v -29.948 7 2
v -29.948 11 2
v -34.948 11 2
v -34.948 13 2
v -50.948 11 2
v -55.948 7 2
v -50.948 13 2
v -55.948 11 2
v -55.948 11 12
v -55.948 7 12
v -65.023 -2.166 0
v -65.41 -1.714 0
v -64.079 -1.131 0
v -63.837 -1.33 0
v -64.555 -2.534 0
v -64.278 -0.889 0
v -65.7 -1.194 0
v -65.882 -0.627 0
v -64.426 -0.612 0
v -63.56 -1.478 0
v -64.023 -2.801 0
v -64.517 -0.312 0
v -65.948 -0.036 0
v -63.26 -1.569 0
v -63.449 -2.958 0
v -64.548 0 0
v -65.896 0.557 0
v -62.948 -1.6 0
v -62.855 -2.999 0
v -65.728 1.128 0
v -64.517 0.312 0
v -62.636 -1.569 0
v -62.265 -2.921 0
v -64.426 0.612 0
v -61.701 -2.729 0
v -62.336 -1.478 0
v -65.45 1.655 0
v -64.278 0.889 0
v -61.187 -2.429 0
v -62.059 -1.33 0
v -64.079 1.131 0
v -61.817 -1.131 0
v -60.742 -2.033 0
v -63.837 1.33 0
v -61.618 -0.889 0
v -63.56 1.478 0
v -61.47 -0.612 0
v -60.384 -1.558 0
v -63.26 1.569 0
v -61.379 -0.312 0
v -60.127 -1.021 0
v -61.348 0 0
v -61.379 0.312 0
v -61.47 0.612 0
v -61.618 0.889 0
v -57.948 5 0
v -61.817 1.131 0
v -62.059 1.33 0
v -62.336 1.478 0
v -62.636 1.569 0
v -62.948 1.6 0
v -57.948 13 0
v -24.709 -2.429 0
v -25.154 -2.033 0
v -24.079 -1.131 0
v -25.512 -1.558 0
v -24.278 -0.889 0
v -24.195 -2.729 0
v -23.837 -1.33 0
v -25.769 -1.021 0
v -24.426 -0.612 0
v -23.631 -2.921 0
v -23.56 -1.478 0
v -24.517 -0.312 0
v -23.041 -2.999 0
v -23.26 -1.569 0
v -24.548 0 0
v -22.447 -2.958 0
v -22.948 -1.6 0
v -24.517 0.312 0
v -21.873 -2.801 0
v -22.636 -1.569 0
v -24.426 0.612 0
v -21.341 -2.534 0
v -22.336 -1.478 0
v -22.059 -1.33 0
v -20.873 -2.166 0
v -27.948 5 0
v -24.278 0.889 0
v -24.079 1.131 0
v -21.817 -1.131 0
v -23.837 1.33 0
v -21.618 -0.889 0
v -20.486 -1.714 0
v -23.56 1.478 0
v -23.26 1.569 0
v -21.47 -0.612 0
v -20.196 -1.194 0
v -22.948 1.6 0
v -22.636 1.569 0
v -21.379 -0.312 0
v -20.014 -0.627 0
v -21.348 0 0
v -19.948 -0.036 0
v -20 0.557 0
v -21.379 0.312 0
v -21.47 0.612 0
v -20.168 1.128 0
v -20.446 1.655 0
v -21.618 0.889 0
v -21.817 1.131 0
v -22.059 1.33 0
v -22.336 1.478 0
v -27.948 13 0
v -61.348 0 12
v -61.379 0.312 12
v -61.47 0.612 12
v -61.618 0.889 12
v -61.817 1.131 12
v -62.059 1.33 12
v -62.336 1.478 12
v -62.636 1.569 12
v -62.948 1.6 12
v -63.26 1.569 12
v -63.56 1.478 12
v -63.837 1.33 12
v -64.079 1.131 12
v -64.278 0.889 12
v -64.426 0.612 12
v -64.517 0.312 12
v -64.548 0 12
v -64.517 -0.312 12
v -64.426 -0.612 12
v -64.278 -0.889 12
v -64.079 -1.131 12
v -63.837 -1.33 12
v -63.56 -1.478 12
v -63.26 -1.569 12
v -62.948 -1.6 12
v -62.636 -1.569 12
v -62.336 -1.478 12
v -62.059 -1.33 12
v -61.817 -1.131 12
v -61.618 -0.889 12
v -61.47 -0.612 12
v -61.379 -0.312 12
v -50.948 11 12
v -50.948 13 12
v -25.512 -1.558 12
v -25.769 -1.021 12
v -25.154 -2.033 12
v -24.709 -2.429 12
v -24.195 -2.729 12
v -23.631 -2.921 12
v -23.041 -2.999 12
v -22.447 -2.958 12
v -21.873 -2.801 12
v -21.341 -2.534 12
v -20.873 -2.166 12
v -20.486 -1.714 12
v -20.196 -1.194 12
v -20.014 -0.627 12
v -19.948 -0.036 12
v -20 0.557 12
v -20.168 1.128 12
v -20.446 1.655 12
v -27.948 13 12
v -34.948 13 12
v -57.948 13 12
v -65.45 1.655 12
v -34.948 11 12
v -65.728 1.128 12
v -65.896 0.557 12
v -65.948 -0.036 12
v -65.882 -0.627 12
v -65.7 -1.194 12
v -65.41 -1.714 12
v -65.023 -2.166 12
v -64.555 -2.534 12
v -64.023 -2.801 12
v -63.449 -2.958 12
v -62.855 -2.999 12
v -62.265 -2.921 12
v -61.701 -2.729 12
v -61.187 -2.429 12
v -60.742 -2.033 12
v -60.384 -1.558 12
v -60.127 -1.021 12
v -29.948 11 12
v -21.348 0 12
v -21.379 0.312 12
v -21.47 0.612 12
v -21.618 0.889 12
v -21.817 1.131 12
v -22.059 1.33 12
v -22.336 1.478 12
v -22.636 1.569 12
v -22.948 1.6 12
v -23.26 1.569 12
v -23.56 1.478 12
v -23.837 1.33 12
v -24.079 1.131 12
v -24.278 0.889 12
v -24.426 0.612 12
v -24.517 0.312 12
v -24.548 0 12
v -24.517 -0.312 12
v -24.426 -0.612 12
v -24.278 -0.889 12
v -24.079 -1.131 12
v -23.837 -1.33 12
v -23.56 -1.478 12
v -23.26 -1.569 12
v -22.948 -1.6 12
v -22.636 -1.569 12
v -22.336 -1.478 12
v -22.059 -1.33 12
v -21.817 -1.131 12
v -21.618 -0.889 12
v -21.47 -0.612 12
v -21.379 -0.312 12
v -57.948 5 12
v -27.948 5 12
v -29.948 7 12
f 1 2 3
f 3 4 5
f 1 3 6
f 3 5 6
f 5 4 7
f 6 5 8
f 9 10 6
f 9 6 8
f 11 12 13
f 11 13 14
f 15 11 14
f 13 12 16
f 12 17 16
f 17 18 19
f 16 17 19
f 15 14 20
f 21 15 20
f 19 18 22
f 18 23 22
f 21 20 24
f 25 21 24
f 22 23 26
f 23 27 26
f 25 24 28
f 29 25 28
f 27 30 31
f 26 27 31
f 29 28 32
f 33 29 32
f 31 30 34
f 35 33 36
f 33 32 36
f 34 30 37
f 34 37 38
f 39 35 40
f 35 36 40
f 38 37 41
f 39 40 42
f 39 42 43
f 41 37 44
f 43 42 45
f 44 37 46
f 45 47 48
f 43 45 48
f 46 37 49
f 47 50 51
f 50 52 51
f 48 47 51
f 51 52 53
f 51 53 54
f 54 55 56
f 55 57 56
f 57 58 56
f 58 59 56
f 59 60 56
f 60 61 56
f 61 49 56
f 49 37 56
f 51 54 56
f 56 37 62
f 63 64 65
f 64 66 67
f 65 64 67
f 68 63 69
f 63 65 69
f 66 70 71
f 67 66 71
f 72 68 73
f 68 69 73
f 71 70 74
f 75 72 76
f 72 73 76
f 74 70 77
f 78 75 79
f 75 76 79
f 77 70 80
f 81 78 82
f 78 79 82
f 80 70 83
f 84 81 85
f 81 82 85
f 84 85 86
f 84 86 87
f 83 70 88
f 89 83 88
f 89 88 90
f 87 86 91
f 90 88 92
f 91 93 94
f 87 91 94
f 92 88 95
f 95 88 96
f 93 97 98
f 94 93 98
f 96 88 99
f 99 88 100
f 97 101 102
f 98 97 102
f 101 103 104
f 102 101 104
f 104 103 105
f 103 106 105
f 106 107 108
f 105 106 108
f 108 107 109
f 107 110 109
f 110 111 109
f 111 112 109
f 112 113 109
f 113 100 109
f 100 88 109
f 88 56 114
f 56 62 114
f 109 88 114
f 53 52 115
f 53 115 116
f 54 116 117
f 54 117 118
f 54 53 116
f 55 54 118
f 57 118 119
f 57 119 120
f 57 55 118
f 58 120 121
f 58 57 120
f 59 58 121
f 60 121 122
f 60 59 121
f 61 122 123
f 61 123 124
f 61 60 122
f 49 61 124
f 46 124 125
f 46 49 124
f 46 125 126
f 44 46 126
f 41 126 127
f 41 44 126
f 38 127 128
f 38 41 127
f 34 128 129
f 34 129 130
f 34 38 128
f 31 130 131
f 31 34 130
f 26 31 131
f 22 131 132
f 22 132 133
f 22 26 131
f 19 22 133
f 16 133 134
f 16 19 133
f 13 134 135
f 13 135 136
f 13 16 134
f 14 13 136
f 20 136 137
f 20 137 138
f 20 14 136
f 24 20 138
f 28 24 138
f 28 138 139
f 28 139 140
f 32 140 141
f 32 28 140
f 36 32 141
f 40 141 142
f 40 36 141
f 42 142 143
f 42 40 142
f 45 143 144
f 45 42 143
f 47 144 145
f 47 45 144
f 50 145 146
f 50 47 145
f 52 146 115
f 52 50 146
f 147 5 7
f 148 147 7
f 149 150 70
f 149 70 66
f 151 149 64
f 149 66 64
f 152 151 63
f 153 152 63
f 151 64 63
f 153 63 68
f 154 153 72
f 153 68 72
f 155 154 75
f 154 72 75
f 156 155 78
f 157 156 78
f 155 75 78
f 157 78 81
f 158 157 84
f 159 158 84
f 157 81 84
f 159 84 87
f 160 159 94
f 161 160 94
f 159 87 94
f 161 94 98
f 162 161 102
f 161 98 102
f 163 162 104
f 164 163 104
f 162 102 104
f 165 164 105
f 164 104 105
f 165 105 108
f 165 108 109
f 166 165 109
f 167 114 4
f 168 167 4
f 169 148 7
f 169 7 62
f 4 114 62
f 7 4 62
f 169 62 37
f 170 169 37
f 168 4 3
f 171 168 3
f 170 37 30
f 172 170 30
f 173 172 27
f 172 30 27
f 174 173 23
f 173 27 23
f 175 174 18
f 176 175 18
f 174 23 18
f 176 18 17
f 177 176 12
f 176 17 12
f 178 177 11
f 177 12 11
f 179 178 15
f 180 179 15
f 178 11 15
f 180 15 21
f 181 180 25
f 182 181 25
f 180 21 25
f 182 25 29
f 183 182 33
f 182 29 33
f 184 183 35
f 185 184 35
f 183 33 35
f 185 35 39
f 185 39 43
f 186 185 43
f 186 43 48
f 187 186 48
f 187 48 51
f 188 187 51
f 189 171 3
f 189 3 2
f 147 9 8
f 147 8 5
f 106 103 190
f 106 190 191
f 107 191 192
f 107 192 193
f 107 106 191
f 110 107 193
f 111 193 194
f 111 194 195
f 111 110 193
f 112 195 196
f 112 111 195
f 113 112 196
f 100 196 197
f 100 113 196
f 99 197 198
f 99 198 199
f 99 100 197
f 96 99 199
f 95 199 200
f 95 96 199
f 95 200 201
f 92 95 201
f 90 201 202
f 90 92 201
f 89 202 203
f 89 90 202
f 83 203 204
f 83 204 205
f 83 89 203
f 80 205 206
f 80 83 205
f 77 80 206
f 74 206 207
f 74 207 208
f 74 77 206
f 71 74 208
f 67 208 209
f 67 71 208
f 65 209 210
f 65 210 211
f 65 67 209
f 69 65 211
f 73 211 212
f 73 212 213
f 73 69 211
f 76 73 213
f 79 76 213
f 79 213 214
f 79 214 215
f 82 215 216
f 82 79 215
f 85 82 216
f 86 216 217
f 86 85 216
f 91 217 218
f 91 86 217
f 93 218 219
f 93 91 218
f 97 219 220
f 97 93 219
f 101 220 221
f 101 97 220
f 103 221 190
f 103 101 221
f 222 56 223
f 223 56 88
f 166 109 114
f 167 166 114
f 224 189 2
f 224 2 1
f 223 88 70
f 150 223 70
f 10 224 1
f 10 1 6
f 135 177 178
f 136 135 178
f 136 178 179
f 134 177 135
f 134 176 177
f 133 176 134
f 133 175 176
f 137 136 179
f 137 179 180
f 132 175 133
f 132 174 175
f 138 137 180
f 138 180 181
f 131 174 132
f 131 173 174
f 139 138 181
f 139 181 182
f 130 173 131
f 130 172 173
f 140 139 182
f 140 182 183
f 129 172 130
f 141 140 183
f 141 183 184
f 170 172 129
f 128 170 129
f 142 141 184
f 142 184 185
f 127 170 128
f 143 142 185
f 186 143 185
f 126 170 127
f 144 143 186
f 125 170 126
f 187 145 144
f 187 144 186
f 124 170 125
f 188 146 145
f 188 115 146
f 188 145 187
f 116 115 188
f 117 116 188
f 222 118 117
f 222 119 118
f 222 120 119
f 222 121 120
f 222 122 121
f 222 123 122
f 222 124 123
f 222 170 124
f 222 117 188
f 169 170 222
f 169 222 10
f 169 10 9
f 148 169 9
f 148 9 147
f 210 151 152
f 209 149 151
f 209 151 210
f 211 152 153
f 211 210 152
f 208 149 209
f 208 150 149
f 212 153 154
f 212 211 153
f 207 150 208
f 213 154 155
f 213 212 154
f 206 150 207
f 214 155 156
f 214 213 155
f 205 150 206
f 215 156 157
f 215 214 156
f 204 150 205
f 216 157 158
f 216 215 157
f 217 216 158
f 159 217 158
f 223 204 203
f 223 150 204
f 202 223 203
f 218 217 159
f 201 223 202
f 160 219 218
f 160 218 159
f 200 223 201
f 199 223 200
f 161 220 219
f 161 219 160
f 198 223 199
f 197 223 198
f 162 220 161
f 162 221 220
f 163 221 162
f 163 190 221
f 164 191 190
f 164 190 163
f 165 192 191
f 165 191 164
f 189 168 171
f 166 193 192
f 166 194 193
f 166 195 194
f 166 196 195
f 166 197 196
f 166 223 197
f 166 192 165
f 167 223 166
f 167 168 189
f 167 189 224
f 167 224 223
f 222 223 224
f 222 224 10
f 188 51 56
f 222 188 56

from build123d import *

# Parameters (mm, degrees)
SKETCH_1_R          = 1.6
EXTRUDE_1_DEPTH     = 12
CUT_EXTRUDE_1_DEPTH = 10


with BuildPart() as part:
    # Эскиз1 → Бобышка-Вытянуть1 (new body)
    with BuildSketch(Plane.XY):
        with BuildLine():
            Line((-57.947933857, 4.999983999), (-27.948022281, 4.999983999))
            Line((-27.948022281, 4.999983999), (-25.768907845, -1.020957985))
            ThreePointArc((-25.768907845, -1.020957985), (-21.600669135, -2.680440009), (-20.445626155, 1.654761283))
            Line((-20.445626155, 1.654761283), (-27.948022281, 12.999984004))
            Line((-27.948022281, 12.999984004), (-57.947933857, 12.999984004))
            Line((-57.947933857, 12.999984004), (-65.450329983, 1.654761282))
            ThreePointArc((-65.450329983, 1.654761282), (-64.295287003, -2.680440008), (-60.127048295, -1.020957985))
            Line((-60.127048295, -1.020957985), (-57.947933857, 4.999983999))
        make_face()
        with Locations((-62.947978069, 0)):
            Circle(SKETCH_1_R, mode=Mode.SUBTRACT)
        with Locations((-22.947978069, 0)):
            Circle(SKETCH_1_R, mode=Mode.SUBTRACT)
    extrude(amount=EXTRUDE_1_DEPTH)

    # Эскиз2 → Вырез-Вытянуть1 (cut)
    with BuildSketch(Plane.XY.offset(12)):
        Polygon((-42.947978069, 12.999984004), (-34.947978069, 12.999984004), (-34.947978069, 10.999984004), (-29.947978069, 10.999984004), (-29.947978069, 6.999984004), (-55.947978069, 6.999984004), (-55.947978069, 10.999984004), (-50.947978069, 10.999984004), (-50.947978069, 12.999984004), align=None)
    extrude(amount=-CUT_EXTRUDE_1_DEPTH, mode=Mode.SUBTRACT)


solid = part.part
